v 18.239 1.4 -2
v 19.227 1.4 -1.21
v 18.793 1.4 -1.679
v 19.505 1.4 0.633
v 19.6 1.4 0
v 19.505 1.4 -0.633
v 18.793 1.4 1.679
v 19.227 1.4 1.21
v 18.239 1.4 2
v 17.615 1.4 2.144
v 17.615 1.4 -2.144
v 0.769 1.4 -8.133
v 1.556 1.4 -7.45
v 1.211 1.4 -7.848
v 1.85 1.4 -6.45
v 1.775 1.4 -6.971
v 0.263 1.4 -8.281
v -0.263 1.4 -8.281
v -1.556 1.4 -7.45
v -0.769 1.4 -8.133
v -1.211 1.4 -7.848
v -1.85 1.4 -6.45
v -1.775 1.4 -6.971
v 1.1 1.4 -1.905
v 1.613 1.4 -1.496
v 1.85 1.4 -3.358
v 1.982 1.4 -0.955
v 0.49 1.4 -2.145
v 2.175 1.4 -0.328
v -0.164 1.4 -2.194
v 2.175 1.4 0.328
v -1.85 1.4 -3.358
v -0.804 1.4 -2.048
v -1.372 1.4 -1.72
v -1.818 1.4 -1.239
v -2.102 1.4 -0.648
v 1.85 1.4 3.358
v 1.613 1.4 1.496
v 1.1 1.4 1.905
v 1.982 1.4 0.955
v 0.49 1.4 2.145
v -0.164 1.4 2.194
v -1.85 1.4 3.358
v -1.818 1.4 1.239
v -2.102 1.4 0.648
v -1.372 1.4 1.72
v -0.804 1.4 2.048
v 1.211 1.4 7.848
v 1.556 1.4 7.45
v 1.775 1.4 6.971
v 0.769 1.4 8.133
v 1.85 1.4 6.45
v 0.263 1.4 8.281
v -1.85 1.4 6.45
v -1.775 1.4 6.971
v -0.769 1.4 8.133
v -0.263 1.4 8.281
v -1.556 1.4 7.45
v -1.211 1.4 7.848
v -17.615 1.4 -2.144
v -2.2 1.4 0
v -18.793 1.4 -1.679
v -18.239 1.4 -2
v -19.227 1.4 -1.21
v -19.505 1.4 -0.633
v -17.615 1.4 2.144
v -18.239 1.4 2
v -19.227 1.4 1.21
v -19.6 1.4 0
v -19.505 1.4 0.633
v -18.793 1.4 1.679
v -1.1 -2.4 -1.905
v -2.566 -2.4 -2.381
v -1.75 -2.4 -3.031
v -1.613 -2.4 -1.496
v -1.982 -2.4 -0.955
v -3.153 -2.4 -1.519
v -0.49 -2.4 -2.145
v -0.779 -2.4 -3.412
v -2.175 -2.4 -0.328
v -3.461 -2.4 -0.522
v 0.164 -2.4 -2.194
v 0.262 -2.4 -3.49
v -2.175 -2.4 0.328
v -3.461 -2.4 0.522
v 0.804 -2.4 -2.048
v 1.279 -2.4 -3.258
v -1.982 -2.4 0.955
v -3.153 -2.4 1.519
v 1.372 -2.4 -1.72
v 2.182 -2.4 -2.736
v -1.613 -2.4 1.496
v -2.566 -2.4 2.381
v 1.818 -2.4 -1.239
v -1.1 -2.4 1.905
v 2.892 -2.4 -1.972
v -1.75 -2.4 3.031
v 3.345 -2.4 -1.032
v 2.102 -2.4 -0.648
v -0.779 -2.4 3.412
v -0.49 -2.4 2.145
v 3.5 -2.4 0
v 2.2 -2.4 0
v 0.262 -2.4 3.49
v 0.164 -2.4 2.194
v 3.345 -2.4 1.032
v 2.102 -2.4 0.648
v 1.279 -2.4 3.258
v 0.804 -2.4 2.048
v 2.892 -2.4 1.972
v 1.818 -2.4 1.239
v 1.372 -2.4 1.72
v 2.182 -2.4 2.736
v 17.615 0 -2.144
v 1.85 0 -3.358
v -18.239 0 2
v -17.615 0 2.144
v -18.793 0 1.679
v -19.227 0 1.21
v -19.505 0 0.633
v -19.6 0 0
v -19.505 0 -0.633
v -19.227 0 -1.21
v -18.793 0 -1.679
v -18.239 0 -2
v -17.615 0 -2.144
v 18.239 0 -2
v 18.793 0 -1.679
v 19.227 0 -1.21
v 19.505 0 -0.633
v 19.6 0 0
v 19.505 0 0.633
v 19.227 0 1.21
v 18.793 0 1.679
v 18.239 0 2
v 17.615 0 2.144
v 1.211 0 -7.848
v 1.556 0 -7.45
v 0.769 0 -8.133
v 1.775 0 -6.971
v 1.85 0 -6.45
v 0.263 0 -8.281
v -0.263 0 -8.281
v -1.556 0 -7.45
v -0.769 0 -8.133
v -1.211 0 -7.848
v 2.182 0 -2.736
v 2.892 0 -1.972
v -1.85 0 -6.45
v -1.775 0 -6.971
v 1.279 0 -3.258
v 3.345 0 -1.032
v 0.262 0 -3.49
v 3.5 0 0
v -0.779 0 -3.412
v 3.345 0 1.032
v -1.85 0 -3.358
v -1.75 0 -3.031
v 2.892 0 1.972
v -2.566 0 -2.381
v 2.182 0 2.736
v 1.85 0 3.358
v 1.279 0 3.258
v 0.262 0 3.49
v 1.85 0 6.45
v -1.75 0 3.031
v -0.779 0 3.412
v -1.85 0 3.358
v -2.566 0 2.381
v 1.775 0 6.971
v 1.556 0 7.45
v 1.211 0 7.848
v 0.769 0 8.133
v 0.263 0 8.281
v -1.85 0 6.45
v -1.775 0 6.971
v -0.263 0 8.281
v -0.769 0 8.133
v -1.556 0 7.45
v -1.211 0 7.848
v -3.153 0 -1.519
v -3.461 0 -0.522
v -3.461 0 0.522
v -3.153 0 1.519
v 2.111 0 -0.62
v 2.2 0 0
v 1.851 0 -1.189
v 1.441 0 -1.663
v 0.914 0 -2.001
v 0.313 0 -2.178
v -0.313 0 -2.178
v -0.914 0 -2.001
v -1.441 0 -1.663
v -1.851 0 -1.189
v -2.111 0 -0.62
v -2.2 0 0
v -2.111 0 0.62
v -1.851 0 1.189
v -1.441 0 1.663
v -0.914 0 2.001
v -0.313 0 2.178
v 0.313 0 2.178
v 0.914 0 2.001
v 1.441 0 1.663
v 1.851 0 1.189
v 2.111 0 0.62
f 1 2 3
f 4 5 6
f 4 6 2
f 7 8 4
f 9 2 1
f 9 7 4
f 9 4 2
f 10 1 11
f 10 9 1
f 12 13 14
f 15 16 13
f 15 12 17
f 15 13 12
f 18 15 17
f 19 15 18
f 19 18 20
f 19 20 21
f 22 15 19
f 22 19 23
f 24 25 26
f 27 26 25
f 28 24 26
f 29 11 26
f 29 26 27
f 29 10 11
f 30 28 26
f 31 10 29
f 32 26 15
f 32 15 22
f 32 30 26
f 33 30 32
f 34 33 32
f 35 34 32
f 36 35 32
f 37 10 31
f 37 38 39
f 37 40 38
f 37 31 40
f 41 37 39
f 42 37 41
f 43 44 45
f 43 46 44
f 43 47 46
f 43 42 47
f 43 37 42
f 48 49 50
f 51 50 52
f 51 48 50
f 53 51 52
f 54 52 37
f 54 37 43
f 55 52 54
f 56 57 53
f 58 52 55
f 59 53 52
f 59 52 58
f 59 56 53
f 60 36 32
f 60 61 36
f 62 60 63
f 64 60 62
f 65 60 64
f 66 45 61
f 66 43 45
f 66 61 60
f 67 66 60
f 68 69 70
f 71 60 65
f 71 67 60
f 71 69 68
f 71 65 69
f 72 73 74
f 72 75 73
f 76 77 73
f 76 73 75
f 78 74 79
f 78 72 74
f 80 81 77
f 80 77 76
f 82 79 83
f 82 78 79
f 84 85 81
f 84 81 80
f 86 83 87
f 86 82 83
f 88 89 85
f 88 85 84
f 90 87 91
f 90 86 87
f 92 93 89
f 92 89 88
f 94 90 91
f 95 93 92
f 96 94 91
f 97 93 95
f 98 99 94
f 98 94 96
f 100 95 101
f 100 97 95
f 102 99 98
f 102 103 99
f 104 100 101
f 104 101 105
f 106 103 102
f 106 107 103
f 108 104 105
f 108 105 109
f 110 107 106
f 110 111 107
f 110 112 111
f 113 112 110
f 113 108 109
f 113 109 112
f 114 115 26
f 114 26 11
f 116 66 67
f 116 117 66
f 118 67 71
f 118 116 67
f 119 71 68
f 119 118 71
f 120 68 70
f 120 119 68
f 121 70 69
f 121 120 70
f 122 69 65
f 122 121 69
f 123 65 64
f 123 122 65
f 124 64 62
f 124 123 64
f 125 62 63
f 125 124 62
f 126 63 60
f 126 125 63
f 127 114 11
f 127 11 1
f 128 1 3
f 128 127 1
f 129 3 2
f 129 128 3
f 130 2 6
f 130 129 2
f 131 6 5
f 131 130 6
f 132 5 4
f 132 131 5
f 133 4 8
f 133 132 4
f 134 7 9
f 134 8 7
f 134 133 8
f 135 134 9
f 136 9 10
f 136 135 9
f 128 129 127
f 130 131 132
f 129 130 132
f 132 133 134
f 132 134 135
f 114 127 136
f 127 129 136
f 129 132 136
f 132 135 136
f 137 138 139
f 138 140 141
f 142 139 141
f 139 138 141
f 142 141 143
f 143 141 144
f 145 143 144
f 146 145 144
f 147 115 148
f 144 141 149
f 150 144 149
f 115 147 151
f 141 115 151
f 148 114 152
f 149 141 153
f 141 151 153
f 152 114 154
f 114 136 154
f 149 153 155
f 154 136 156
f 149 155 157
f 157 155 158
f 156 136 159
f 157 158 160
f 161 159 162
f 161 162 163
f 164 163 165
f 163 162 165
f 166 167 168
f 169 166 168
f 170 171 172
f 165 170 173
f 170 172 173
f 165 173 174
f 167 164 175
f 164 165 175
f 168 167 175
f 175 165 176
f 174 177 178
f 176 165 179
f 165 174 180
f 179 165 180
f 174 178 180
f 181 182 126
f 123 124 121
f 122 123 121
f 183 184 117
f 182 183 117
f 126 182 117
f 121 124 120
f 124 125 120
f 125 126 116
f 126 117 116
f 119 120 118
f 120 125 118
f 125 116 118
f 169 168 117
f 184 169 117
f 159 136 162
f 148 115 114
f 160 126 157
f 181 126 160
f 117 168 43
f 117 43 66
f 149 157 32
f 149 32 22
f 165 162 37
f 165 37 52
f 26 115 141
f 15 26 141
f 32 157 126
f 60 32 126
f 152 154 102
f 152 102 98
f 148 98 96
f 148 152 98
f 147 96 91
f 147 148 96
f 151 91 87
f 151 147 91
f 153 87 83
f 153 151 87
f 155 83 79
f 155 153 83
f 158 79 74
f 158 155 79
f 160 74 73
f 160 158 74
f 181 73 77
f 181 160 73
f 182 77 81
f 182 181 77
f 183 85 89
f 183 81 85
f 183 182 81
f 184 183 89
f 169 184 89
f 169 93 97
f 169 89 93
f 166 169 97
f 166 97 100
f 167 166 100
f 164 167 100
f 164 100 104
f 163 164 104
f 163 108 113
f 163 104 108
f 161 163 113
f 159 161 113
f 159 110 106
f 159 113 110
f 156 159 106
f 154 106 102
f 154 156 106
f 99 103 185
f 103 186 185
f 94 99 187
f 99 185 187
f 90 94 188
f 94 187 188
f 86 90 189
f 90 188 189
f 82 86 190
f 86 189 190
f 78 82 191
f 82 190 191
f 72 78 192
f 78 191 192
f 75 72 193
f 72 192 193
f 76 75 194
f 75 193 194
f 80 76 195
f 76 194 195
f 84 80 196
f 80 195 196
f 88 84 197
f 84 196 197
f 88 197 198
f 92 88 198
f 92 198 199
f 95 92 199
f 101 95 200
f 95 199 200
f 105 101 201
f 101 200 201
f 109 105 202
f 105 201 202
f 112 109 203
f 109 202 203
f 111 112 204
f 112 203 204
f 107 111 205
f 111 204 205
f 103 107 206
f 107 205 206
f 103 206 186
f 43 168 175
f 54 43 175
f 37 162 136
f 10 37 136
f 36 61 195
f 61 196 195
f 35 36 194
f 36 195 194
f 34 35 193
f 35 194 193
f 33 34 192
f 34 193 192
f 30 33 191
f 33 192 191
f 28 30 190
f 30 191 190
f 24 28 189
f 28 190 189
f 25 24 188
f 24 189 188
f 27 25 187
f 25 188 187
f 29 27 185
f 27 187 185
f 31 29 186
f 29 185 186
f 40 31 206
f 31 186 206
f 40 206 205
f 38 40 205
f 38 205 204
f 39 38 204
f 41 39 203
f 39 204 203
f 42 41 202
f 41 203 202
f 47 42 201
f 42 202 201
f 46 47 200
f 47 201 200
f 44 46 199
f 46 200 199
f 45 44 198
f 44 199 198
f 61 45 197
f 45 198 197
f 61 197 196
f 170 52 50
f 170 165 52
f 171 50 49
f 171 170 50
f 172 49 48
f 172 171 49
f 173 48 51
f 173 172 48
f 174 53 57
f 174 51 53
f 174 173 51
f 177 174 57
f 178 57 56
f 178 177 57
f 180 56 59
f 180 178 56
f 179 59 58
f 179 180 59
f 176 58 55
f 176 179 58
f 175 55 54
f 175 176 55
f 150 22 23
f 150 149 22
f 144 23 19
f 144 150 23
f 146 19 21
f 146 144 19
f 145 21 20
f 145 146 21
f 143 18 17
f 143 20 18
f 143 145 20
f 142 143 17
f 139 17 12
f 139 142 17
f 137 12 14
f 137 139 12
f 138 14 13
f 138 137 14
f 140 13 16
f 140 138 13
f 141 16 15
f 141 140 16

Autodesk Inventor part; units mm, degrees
ref_plane "YZ Plane" through (0, 0, 0) normal (1, 0, 0) x (0, 1, 0)
ref_plane "XZ Plane" through (0, 0, 0) normal (0, 1, 0) x (-1, 0, 0)
ref_plane "XY Plane" through (0, 0, 0) normal (0, 0, 1) x (1, 0, 0)
sketch "Szkic1" plane through (0, 0, 0) normal (0, 1, 0) x (-1, 0, 0)
  line L0 (0, 0) -> (19.6, 0) construction
  line L1 (0, 0) -> (-19.6, 0) construction
  line L2 (0, 0) -> (0, 8.3) construction
  line L3 (0, 0) -> (0, -8.3) construction
  circle A0 centre (0, 0) radius 2.2 construction
  line L4 (0, -8.3) -> (0, -6.45) construction
  circle A1 centre (0, -6.45) radius 1.85 construction
  line L5 (0, 8.3) -> (0, 6.45) construction
  circle A2 centre (0, 6.45) radius 1.85 construction
  circle A3 centre (0, 0) radius 3.5 construction
  line L6 (19.6, 0) -> (17.45, 0) construction
  circle A4 centre (17.45, 0) radius 2.15 construction
  line L7 (-19.6, 0) -> (-17.45, 0) construction
  circle A5 centre (-17.45, 0) radius 2.15 construction
  line L8 (0, 3.5) -> (-17.6151, 2.1437) construction
  line L9 (0, -3.5) -> (-17.6151, -2.1437) construction
  line L10 (0, 3.5) -> (17.6151, 2.1437) construction
  line L11 (0, -3.5) -> (17.6151, -2.1437) construction
  arc A6 (1.85, 6.45) -> (-1.85, 6.45) centre (0, 6.45) ccw
  arc A7 (-1.85, -6.45) -> (1.85, -6.45) centre (0, -6.45) ccw
  arc A8 (17.6151, -2.1437) -> (17.6151, 2.1437) centre (17.45, 0) ccw
  arc A9 (-17.6151, 2.1437) -> (-17.6151, -2.1437) centre (-17.45, 0) ccw
  circle A10 centre (0, 0) radius 2.2
  line L12 (1.85, 6.45) -> (1.85, -6.45) construction
  line L13 (-1.85, 6.45) -> (-1.85, -6.45) construction
  line L14 (1.85, 3.3576) -> (1.85, 6.45)
  line L15 (-1.85, 3.3576) -> (-1.85, 6.45)
  line L16 (-1.85, -3.3576) -> (-1.85, -6.45)
  line L17 (1.85, -3.3576) -> (1.85, -6.45)
  line L18 (1.85, -3.3576) -> (17.6151, -2.1437)
  line L19 (1.85, 3.3576) -> (17.6151, 2.1437)
  line L20 (-1.85, 3.3576) -> (-17.6151, 2.1437)
  line L21 (-1.85, -3.3576) -> (-17.6151, -2.1437)
  dimension "d0" = 19.6
  dimension "d1" = 19.6
  dimension "d2" = 8.3
  dimension "d3" = 8.3
  dimension "d4" = 4.4
  dimension "d5" = 1.85
  dimension "d6" = 1.85
  dimension "d7" = 7
  dimension "d8" = 2.15
  dimension "d9" = 2.15
extrude "Wyciągnięcie proste1" add sketch "Szkic1" along normal blind 1.4
sketch "Szkic2" plane through (0, 0, 0) normal (0, -1, 0) x (1, 0, 0)
  circle A0 centre (0, 0) radius 2.2 projected
  circle A1 centre (0, 0) radius 3.5
  dimension "d12" = 7
extrude "Wyciągnięcie proste2" add sketch "Szkic2" along normal blind 2.4
properties part number "orczyk_k"
